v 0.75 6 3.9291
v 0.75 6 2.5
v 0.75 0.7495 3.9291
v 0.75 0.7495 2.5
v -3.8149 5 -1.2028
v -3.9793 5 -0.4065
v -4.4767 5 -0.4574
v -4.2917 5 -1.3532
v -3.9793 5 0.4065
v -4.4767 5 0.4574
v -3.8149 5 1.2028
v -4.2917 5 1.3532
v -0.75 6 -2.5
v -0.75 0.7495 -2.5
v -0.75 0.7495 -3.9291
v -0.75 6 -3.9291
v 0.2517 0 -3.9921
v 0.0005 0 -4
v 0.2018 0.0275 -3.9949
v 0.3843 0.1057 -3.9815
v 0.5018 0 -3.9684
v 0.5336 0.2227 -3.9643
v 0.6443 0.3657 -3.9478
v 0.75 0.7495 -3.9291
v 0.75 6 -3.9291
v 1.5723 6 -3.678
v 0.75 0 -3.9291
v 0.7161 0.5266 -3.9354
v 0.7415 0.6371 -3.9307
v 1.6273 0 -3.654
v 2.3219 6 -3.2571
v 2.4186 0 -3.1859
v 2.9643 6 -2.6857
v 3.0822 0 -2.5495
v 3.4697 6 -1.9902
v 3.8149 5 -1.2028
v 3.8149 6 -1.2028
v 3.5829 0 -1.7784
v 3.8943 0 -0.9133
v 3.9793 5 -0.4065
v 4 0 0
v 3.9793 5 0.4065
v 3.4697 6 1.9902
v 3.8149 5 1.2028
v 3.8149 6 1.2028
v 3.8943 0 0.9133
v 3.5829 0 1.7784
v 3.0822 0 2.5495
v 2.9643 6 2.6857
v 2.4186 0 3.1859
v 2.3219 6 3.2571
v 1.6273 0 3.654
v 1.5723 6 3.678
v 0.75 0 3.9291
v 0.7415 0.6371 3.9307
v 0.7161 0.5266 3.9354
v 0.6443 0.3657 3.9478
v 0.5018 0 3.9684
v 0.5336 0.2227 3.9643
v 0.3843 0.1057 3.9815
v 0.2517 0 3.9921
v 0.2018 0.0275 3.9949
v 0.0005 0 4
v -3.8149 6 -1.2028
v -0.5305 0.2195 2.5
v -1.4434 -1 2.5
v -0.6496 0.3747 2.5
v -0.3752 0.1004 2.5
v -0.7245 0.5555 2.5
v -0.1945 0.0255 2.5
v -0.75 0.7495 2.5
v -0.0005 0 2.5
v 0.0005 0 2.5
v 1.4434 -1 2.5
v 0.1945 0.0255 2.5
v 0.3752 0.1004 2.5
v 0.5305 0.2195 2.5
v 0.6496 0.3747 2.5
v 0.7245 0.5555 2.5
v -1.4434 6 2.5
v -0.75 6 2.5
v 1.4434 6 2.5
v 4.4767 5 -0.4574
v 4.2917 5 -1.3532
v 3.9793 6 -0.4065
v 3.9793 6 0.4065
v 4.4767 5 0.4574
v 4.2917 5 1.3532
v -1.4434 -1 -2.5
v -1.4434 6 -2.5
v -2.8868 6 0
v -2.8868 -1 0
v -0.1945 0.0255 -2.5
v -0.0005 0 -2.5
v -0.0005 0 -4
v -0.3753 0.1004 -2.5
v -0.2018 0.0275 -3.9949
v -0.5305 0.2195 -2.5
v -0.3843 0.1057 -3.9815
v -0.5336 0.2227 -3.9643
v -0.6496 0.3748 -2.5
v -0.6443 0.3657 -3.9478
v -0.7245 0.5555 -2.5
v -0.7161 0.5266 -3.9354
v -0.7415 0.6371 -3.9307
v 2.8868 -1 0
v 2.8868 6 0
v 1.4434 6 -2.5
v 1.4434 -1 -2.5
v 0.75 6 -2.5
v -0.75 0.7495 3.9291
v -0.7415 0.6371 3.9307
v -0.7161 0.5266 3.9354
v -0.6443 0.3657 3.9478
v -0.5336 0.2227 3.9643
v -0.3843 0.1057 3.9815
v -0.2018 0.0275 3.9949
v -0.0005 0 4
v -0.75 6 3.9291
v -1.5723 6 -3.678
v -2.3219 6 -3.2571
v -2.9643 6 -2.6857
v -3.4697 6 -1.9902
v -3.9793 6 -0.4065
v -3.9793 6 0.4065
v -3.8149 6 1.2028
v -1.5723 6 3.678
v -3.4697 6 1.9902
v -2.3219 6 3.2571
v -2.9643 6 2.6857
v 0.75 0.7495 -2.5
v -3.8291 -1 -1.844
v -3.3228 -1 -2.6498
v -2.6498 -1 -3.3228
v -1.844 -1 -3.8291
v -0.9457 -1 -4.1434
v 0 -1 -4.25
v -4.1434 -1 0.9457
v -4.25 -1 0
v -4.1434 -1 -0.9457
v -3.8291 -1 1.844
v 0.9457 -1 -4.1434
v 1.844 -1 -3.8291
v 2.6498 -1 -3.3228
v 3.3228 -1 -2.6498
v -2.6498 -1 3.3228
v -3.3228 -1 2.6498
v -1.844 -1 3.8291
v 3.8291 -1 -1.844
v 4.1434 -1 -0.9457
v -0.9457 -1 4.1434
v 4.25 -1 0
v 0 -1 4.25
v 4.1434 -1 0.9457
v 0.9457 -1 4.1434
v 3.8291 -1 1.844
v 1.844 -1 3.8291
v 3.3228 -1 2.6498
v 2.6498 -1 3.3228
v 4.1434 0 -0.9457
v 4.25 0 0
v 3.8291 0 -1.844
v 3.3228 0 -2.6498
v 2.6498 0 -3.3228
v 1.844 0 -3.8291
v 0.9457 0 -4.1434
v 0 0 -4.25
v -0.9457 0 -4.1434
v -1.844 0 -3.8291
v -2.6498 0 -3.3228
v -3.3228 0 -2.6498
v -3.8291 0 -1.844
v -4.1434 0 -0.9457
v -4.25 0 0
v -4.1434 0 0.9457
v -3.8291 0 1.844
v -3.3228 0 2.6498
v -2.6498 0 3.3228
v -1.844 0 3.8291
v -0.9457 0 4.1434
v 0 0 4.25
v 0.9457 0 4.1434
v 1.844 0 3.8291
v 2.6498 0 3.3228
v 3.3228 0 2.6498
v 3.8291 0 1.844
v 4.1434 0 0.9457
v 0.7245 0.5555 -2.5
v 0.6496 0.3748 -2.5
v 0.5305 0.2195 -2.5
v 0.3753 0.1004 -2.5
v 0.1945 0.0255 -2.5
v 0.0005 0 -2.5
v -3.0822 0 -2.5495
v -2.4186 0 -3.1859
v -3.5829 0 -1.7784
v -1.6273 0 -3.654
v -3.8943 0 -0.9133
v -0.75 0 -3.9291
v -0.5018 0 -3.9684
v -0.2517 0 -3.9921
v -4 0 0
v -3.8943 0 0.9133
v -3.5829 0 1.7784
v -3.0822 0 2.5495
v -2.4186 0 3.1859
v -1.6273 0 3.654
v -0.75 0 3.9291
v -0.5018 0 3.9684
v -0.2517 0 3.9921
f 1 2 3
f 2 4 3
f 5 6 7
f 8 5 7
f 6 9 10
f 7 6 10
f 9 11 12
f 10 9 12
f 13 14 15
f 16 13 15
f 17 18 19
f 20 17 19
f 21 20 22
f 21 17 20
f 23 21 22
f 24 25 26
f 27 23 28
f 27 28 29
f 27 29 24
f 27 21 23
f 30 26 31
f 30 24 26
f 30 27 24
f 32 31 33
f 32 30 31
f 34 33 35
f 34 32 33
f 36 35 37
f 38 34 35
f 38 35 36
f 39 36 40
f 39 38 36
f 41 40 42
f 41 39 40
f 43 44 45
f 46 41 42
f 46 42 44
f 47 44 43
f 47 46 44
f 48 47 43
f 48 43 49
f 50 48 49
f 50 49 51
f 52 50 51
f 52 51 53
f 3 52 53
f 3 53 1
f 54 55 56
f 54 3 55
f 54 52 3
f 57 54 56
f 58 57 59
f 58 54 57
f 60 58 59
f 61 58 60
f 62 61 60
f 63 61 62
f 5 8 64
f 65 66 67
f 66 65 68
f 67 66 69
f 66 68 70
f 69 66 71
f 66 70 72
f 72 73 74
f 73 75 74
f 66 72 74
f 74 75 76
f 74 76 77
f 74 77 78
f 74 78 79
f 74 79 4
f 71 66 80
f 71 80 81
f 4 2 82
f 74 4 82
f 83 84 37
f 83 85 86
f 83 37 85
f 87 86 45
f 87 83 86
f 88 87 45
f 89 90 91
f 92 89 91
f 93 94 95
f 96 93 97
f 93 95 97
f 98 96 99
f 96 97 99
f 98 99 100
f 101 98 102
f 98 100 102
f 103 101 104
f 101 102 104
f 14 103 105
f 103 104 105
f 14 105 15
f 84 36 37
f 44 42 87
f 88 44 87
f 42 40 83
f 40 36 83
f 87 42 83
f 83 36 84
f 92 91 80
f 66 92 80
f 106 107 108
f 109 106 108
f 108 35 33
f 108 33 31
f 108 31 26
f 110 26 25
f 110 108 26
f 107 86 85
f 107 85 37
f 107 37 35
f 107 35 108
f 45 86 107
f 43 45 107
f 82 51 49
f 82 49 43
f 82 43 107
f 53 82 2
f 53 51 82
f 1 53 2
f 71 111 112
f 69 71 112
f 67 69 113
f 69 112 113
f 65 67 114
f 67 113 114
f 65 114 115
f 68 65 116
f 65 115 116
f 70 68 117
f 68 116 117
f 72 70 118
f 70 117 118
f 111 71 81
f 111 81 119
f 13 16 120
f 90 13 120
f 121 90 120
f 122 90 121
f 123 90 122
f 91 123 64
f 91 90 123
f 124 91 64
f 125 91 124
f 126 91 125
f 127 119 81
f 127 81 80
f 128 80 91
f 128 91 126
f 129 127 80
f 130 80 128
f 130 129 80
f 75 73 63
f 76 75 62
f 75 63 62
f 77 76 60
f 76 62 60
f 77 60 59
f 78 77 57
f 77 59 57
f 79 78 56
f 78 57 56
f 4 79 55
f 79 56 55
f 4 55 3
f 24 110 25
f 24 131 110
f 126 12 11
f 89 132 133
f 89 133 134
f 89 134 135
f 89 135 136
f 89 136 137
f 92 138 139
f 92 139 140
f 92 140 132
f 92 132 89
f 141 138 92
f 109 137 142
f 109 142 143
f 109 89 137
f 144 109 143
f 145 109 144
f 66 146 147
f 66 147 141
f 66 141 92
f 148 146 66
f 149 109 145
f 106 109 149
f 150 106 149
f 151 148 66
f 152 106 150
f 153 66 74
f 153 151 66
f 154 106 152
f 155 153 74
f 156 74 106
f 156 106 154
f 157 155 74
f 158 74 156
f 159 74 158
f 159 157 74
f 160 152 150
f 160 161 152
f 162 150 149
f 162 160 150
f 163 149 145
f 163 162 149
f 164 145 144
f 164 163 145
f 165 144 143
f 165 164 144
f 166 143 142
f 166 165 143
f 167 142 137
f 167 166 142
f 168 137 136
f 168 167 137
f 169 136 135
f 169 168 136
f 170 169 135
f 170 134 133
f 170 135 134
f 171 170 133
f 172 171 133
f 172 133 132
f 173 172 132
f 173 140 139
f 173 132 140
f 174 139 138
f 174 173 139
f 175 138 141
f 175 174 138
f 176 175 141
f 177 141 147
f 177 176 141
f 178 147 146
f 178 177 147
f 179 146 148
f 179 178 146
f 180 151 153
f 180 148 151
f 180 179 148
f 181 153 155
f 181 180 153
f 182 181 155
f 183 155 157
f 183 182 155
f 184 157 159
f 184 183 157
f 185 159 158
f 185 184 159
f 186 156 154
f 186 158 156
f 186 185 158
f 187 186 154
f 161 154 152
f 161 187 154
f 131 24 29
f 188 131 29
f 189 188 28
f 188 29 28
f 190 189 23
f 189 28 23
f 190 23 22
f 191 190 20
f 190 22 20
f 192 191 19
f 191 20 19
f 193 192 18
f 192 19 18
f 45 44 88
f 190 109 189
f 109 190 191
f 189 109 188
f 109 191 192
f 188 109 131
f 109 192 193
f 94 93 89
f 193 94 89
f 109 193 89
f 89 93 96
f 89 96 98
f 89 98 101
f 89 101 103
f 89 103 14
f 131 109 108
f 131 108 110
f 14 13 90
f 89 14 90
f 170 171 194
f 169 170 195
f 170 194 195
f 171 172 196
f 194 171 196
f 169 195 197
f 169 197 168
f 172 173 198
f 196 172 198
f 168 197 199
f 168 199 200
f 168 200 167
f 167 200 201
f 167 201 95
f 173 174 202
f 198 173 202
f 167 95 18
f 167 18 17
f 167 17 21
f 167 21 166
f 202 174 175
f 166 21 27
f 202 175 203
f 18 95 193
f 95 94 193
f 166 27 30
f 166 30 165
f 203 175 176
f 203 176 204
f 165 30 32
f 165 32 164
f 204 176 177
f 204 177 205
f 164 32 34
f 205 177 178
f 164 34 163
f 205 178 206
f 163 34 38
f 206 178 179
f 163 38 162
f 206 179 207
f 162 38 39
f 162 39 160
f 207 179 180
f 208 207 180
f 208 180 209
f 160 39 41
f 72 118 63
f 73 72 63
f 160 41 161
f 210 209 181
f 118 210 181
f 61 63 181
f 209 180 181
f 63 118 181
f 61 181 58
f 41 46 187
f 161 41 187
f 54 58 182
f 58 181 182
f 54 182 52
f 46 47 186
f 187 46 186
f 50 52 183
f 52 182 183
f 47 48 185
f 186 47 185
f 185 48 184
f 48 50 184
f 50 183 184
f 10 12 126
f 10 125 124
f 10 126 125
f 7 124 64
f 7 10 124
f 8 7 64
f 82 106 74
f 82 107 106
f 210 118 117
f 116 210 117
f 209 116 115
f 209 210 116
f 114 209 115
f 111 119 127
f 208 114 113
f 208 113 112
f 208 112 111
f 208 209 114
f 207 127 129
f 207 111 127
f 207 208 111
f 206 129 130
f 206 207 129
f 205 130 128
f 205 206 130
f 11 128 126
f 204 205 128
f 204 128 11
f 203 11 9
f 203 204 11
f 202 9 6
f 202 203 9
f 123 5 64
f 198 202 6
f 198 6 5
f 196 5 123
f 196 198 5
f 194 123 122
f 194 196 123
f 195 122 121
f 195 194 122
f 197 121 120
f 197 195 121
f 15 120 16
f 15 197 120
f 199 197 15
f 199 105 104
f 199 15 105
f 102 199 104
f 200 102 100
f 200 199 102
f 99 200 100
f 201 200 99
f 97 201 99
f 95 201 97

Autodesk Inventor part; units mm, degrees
ref_plane "YZ Plane" through (0, 0, 0) normal (1, 0, 0) x (0, 1, 0)
ref_plane "XZ Plane" through (0, 0, 0) normal (0, 1, 0) x (-1, 0, 0)
sketch "Sketch1" plane through (0, 0, 0) normal (0, 1, 0) x (-1, 0, 0)
  circle A0 centre (0, 0) radius 4
  circle A1 centre (0, 0) radius 2.5 construction
  line L0 (1.4434, 2.5) -> (2.8868, 0)
  line L1 (2.8868, 0) -> (1.4434, -2.5)
  line L2 (1.4434, -2.5) -> (-1.4434, -2.5)
  line L3 (-1.4434, -2.5) -> (-2.8868, 0)
  line L4 (-2.8868, 0) -> (-1.4434, 2.5)
  line L5 (-1.4434, 2.5) -> (1.4434, 2.5)
  line L6 (0, -2.5) -> (0, -4) construction
  line L7 (0.75, -2.5) -> (0.75, -3.9291)
  line L8 (-0.75, -2.5) -> (-0.75, -3.9291)
  line L9 (2.8868, 0) -> (-2.8868, 0) construction
  line L10 (0.75, 2.5) -> (0.75, 3.9291)
  line L11 (-0.75, 2.5) -> (-0.75, 3.9291)
  point P0 (0, 2.5)
  point P1 (-0.75, 2.5)
  point P2 (-0.75, 3.9291)
  point P3 (0.75, 3.9291)
  point P4 (0.75, 2.5)
  dimension "d1" = 5
  dimension "d0" = 8
  dimension "d2" = 0.75
  dimension "d3" = 0.75
extrude "Extrusion1" add sketch "Sketch1" along normal blind 6 contours A0 L7 L2 L1 L0 L5 L10 | L11 L5 L4 L3 L2 L8 A0
sketch "Sketch2" plane through (0, 0, 0) normal (0, -1, 0) x (1, 0, 0)
  circle A0 centre (0, 0) radius 4.25
  line L0 (2.8868, 0) -> (1.4434, 2.5) projected
  line L1 (2.8868, 0) -> (1.4434, -2.5)
  line L2 (1.4434, -2.5) -> (-1.4434, -2.5)
  line L3 (-1.4434, -2.5) -> (-2.8868, 0)
  line L4 (-2.8868, 0) -> (-1.4434, 2.5)
  line L5 (-1.4434, 2.5) -> (1.4434, 2.5)
  line L6 (1.4434, 2.5) -> (2.8868, 0)
  dimension "d6" = 8.5
extrude "Extrusion2" add sketch "Sketch2" along normal blind 1
ref_plane "Work Plane1" through (0.75, 6, 0) normal (0, 0, 1) x (1, 0, 0)
sketch "Sketch3" plane through (0.75, 6, 0) normal (0, 0, 1) x (1, 0, 0)
  line L0 (3.25, 0) -> (0, 0) projected
  line L1 (3.25, 0) -> (3.25, -1)
  line L2 (3.25, -6) -> (3.25, 0) projected
  line L3 (3.25, -1) -> (3.75, -1)
  line L4 (3.75, -1) -> (3.25, 0)
  line L5 (3.25, 0) -> (2.9426, 0)
  line L6 (2.9426, 0) -> (2.9426, -1)
  line L7 (2.9426, -1) -> (3.25, -1)
  line L8 (-0.75, -6) -> (-0.75, 0) construction
  line L9 (-4.75, 0) -> (-1.5, 0)
  line L10 (-4.75, 0) -> (-4.75, -1)
  line L11 (-4.75, -1) -> (-5.25, -1)
  line L12 (-5.25, -1) -> (-4.75, 0)
  line L13 (-4.4426, 0) -> (-4.4426, -1)
  line L14 (-4.4426, -1) -> (-4.75, -1)
  dimension "d9" = 1
  dimension "d10" = 0.5
revolve "Revolution1" add sketch "Sketch3" angle 35 mid plane about axis through (0, 0, 0) along (0, 1, 0) contours L4 L3 L1 | L10 L11 L12
fillet "Fillet1" radius 0.75 4 edges at (0.75, 0, 3.2145) (-0.75, 0, 3.2145) (0.75, 0, -3.2145) (-0.75, 0, -3.2145)
properties part number "5mmHexInsert"
